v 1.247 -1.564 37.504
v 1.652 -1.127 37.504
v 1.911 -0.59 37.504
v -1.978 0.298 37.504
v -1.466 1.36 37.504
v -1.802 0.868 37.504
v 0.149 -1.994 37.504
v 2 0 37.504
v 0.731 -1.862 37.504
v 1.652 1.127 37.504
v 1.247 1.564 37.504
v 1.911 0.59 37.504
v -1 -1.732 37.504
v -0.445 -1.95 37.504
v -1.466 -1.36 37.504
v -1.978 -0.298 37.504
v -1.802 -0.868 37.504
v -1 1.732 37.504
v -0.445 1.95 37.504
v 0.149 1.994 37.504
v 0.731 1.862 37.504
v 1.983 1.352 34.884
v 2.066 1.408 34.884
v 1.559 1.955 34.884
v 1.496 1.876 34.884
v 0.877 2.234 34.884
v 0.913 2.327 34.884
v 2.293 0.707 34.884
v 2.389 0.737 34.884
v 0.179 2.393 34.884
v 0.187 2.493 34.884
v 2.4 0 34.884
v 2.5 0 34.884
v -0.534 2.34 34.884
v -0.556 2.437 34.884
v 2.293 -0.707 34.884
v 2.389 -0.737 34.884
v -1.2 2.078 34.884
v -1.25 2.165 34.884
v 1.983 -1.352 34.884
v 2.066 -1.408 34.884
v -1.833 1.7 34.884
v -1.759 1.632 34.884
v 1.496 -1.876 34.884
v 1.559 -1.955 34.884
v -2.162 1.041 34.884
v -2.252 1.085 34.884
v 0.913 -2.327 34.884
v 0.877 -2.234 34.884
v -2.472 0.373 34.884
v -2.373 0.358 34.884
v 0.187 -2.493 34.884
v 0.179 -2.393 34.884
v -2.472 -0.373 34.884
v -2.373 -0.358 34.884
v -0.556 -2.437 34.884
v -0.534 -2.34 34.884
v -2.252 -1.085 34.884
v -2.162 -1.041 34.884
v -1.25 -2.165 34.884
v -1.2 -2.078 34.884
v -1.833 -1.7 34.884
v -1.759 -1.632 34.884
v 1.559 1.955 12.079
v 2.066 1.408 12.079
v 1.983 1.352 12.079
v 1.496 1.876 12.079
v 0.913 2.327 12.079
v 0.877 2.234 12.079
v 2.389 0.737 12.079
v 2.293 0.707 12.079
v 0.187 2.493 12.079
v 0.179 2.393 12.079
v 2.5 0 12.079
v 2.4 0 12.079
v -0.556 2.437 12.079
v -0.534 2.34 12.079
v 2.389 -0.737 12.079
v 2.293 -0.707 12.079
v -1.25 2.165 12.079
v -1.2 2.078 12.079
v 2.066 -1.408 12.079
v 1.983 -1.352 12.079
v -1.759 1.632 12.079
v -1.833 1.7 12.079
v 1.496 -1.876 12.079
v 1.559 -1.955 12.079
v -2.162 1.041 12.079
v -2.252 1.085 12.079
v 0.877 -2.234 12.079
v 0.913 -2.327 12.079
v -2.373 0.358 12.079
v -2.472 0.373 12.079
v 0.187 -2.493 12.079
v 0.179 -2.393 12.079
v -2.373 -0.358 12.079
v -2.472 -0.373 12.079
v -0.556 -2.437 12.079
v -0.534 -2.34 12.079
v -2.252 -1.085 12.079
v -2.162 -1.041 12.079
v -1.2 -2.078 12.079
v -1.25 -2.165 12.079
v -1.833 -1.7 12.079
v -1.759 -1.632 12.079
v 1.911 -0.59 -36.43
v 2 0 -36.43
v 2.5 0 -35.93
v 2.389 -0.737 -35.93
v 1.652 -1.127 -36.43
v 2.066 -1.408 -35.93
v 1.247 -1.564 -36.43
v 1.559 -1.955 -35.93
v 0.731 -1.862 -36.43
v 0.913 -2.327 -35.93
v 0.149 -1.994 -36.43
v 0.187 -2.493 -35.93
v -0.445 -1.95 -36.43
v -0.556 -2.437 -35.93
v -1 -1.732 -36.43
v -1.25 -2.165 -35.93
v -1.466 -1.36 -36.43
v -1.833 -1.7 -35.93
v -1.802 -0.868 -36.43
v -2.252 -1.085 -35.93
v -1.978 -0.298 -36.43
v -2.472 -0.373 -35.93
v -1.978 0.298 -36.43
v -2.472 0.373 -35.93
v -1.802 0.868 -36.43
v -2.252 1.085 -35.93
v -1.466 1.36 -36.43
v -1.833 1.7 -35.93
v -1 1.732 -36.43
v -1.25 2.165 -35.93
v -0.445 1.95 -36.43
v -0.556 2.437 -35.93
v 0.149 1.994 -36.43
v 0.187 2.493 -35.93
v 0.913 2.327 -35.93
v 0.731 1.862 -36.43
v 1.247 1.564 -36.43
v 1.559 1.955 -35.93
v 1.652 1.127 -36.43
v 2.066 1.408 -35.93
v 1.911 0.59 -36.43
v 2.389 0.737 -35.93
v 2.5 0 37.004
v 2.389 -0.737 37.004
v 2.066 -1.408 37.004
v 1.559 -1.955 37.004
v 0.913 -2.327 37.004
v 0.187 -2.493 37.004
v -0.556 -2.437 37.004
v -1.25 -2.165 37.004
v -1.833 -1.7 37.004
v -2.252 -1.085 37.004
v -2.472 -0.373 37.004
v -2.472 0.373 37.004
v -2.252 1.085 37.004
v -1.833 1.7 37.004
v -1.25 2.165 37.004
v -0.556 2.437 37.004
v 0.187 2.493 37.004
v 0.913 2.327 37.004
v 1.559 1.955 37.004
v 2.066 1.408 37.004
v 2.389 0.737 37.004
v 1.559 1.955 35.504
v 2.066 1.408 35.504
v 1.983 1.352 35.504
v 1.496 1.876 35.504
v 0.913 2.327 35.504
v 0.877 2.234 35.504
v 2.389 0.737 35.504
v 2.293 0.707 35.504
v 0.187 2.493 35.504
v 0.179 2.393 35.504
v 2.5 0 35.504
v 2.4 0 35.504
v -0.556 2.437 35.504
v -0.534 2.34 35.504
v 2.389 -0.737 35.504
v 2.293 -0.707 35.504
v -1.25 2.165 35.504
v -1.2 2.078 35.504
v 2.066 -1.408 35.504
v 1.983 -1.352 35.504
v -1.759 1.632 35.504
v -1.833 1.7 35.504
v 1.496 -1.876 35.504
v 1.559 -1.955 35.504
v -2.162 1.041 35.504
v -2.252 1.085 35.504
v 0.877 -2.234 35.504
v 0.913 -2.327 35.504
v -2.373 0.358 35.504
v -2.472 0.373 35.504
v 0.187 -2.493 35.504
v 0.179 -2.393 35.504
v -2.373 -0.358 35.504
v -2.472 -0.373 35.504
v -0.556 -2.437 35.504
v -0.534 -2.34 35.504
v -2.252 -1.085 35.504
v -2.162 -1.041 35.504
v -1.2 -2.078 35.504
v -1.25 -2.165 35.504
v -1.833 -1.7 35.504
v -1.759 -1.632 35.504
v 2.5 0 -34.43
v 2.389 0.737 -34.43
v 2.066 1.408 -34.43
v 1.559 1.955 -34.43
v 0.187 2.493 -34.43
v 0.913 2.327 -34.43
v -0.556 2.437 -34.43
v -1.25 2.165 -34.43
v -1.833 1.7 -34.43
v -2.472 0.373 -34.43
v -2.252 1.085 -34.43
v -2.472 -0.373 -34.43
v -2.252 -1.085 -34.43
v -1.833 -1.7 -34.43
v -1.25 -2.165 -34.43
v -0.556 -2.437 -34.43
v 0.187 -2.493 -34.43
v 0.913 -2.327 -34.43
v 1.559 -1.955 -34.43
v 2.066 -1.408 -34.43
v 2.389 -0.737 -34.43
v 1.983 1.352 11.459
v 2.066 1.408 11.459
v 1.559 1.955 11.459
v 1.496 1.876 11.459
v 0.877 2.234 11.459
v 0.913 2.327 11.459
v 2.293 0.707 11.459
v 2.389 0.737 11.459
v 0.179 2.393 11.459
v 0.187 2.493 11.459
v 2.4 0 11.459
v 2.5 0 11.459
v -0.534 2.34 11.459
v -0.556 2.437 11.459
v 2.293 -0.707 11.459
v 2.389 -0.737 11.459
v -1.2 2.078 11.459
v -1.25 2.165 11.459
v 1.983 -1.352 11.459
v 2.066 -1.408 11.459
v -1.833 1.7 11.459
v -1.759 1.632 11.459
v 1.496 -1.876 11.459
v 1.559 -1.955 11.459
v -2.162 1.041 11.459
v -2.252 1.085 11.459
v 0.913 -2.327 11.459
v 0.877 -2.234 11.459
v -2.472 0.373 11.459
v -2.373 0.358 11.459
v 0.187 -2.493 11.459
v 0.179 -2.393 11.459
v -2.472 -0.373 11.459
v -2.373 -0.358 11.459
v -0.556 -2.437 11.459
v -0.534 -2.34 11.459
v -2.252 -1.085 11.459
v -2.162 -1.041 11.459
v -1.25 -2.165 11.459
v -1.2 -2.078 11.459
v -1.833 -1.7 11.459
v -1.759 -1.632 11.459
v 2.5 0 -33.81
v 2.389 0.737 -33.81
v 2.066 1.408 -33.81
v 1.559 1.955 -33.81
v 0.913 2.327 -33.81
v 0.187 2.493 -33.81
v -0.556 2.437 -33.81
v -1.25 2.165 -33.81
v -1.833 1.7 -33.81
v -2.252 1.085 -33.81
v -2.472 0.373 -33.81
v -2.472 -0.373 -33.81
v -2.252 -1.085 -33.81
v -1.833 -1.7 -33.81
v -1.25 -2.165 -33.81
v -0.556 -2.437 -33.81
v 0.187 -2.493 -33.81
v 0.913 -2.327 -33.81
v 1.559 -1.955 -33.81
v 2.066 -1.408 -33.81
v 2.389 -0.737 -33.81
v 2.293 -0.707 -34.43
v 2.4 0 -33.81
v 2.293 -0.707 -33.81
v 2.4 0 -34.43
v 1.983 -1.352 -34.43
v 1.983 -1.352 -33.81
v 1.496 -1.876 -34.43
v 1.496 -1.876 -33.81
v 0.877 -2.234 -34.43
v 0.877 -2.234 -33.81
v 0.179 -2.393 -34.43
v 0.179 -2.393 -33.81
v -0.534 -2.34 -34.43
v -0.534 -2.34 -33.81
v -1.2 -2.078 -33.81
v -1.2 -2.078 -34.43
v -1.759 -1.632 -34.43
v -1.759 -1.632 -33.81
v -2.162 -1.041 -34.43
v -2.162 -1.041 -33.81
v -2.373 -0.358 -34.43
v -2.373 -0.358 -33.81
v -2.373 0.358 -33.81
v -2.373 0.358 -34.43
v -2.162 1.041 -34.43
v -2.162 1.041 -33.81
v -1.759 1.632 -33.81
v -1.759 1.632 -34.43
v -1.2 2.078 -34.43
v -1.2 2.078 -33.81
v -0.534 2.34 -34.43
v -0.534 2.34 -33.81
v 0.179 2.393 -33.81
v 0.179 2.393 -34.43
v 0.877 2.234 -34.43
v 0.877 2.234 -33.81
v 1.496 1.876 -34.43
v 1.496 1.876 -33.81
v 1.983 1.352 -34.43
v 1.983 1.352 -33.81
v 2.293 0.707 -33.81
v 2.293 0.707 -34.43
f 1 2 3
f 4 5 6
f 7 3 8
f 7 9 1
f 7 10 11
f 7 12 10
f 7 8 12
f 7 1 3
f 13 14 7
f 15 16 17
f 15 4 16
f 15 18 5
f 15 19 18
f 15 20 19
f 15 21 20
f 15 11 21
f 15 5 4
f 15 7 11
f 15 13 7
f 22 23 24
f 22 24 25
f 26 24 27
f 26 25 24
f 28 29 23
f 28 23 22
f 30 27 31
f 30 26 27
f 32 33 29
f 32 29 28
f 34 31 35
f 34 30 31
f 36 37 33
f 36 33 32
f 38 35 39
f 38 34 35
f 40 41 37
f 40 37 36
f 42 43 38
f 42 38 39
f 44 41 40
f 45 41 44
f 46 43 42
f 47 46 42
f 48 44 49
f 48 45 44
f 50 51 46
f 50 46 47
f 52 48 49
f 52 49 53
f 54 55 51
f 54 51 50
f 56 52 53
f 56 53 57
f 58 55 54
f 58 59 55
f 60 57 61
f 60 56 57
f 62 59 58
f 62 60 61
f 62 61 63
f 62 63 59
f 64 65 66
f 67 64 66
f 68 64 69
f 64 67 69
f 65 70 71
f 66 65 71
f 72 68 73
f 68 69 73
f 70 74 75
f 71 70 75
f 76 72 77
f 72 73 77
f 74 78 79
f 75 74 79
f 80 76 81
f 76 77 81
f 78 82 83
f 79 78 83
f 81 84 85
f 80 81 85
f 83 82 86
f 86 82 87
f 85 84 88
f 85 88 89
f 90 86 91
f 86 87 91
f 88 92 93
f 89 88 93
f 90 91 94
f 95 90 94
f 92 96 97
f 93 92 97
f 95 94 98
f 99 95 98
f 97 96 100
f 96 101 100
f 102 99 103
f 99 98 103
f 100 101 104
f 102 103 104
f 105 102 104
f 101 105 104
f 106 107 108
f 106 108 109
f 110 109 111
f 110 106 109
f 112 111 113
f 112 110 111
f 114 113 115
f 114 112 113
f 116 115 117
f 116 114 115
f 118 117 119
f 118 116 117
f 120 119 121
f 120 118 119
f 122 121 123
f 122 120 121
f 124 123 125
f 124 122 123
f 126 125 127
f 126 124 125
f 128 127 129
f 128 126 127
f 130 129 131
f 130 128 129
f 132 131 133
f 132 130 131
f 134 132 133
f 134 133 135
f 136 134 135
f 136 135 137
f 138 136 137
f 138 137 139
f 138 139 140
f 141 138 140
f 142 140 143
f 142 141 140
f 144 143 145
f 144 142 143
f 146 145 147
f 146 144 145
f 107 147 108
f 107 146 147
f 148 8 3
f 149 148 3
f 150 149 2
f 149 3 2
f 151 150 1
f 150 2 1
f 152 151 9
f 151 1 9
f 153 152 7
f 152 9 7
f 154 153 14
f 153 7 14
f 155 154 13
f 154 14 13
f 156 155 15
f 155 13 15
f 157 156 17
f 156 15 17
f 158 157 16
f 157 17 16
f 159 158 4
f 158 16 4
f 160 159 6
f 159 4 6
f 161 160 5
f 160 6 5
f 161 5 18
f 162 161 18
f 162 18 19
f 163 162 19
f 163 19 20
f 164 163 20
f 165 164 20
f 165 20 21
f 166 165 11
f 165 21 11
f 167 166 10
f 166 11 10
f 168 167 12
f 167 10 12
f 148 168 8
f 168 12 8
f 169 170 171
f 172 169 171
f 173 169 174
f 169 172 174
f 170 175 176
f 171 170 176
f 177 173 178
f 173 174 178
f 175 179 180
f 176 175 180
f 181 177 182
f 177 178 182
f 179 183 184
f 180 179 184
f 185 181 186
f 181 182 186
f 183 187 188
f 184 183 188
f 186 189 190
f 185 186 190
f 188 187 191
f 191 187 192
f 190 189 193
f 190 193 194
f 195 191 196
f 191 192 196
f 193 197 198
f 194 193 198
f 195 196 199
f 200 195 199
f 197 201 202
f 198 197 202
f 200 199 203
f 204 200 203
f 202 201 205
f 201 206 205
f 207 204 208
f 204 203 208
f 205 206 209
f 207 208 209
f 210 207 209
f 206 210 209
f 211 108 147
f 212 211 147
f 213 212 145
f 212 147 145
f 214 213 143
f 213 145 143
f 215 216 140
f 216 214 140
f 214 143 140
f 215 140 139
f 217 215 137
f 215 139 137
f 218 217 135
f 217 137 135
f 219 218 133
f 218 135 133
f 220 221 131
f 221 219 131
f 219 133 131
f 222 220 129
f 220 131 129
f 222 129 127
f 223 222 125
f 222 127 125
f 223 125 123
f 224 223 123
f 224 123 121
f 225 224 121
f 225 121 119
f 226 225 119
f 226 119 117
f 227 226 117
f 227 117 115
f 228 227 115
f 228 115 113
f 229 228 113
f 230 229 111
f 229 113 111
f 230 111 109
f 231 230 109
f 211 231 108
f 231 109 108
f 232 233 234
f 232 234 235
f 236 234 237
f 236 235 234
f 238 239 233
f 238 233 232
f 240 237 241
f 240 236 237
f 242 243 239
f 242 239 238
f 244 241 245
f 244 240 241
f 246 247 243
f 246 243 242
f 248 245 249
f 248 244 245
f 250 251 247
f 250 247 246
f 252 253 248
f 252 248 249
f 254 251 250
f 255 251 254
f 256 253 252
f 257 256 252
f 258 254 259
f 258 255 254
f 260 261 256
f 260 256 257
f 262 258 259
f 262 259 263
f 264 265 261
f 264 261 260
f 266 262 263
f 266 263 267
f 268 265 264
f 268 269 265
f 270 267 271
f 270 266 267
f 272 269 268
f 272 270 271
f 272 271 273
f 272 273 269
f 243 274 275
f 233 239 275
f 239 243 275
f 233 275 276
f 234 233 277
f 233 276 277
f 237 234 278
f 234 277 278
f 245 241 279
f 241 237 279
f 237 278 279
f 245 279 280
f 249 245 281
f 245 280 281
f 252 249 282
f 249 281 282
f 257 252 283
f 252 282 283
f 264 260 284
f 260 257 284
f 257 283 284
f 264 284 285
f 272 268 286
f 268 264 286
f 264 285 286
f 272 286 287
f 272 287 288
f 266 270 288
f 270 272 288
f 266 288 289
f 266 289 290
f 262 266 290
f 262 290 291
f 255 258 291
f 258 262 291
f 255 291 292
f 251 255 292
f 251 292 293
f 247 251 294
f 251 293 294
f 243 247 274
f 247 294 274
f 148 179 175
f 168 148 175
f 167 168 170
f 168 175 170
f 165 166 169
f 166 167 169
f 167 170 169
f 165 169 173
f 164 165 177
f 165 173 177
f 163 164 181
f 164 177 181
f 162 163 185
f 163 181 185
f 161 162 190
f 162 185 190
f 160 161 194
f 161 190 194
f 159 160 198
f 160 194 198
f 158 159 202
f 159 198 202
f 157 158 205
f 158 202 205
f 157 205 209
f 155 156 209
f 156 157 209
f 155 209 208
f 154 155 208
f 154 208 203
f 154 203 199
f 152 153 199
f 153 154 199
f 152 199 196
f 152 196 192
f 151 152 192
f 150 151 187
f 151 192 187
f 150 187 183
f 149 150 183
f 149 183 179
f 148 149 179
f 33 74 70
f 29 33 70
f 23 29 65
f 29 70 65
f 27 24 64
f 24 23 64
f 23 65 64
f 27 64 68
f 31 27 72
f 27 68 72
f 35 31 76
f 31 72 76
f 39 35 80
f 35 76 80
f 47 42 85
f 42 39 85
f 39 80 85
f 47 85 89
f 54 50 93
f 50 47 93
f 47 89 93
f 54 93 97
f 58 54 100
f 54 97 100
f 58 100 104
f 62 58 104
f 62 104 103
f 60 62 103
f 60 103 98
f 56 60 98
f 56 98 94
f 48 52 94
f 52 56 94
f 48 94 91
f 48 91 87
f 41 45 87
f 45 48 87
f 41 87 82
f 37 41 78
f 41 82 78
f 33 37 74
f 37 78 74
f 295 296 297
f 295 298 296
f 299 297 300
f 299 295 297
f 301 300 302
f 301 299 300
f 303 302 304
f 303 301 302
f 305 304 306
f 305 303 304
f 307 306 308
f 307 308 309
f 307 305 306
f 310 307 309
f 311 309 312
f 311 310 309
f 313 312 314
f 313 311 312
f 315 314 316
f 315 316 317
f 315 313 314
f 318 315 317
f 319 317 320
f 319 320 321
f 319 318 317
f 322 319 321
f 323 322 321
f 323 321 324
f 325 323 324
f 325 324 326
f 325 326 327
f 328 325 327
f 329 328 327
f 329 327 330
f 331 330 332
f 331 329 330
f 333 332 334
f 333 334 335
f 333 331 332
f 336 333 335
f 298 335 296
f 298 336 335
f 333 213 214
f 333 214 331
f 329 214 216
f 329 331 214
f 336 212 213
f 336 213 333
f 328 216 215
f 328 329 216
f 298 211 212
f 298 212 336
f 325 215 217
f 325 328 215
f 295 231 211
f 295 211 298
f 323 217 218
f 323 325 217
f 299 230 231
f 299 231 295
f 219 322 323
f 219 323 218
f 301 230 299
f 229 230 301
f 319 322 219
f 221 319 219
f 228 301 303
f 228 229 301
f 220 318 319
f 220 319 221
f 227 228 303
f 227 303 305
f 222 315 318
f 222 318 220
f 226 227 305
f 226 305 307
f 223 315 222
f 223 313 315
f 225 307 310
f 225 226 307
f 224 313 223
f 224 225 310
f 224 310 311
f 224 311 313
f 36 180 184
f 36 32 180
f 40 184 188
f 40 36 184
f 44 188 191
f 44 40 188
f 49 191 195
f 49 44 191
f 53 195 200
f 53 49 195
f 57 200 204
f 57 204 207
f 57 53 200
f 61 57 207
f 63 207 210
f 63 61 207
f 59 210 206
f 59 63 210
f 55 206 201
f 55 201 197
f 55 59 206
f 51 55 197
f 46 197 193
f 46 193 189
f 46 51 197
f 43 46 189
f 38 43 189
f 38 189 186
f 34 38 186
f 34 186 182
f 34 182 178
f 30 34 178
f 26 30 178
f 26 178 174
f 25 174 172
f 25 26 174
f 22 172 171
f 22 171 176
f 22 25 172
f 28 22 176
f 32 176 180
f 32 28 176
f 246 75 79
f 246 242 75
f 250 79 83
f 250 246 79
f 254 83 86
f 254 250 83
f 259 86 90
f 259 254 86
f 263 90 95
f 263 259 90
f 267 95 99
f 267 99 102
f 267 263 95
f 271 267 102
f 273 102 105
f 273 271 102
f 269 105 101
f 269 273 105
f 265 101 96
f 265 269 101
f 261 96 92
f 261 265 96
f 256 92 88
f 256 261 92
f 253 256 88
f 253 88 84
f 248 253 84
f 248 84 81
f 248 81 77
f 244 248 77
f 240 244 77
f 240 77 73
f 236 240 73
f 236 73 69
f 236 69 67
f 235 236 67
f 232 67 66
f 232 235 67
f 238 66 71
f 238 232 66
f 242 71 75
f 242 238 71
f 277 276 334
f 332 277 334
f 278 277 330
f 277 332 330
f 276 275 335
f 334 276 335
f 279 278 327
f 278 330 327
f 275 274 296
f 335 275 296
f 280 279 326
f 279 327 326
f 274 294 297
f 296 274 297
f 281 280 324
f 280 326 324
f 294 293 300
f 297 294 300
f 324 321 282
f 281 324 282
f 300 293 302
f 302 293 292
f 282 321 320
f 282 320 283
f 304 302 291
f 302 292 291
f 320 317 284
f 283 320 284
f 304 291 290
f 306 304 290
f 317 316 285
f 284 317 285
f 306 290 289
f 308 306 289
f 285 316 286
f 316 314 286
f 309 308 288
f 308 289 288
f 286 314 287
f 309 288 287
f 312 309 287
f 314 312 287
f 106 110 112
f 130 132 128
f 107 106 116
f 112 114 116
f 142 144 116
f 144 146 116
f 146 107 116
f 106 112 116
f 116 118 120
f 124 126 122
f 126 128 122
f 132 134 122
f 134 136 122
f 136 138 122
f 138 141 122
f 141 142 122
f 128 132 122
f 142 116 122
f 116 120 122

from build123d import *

# Parameters (mm, degrees)
BOSS_EXTRUDE1_DEPTH      = 50
BOSS_EXTRUDE1_DEPTH_BACK = 50
SKETCH3_R                = 2.5
CHAMFER1_SIZE            = 0.35
SKETCH5_W                = 1
SKETCH5_H                = 0.62
SKETCH5_W_2              = 2.5
SKETCH5_H_2              = 13.569648194
SKETCH5_H_3              = 12.496351806
CHAMFER3_SIZE            = 0.5


with BuildPart() as part:
    # Sketch3 → Boss-Extrude1 (new, two sides: drawn at the far end of the back side and taken through both)
    with BuildSketch(Plane.XY.offset(-BOSS_EXTRUDE1_DEPTH_BACK)):
        Circle(SKETCH3_R)
    extrude(amount=BOSS_EXTRUDE1_DEPTH + BOSS_EXTRUDE1_DEPTH_BACK)

    # Chamfer1
    chamfer1_edges = [part.edges().sort_by_distance(p)[0] for p in [
        (-2.5, 0, -50),
        (-2.5, 0, 50),
    ]]
    chamfer(chamfer1_edges, length=CHAMFER1_SIZE)

    # Sketch5 → Cut-Revolve5 (revolve, cut)
    with BuildSketch(Plane(origin=(0, 0, 0), x_dir=(1, 0, 0), z_dir=(0, 1, 0))):
        with Locations((2.9, 34.120351806)):
            Rectangle(SKETCH5_W, SKETCH5_H)
        with Locations((1.25, 43.215175903)):
            Rectangle(SKETCH5_W_2, SKETCH5_H_2)
        with Locations((2.9, -35.193648194)):
            Rectangle(SKETCH5_W, SKETCH5_H)
        with Locations((1.25, -43.751824097)):
            Rectangle(SKETCH5_W_2, SKETCH5_H_3)
        with Locations((2.9, -11.768648194)):
            Rectangle(SKETCH5_W, SKETCH5_H)
    revolve(axis=Axis((0, 0, 50), (0, 0, -1)), mode=Mode.SUBTRACT)

    # Chamfer3
    chamfer3_edges = [part.edges().sort_by_distance(p)[0] for p in [
        (-2.5, 0, 37.503648194),
        (-2.5, 0, -36.430351806),
    ]]
    chamfer(chamfer3_edges, length=CHAMFER3_SIZE)


solid = part.part
